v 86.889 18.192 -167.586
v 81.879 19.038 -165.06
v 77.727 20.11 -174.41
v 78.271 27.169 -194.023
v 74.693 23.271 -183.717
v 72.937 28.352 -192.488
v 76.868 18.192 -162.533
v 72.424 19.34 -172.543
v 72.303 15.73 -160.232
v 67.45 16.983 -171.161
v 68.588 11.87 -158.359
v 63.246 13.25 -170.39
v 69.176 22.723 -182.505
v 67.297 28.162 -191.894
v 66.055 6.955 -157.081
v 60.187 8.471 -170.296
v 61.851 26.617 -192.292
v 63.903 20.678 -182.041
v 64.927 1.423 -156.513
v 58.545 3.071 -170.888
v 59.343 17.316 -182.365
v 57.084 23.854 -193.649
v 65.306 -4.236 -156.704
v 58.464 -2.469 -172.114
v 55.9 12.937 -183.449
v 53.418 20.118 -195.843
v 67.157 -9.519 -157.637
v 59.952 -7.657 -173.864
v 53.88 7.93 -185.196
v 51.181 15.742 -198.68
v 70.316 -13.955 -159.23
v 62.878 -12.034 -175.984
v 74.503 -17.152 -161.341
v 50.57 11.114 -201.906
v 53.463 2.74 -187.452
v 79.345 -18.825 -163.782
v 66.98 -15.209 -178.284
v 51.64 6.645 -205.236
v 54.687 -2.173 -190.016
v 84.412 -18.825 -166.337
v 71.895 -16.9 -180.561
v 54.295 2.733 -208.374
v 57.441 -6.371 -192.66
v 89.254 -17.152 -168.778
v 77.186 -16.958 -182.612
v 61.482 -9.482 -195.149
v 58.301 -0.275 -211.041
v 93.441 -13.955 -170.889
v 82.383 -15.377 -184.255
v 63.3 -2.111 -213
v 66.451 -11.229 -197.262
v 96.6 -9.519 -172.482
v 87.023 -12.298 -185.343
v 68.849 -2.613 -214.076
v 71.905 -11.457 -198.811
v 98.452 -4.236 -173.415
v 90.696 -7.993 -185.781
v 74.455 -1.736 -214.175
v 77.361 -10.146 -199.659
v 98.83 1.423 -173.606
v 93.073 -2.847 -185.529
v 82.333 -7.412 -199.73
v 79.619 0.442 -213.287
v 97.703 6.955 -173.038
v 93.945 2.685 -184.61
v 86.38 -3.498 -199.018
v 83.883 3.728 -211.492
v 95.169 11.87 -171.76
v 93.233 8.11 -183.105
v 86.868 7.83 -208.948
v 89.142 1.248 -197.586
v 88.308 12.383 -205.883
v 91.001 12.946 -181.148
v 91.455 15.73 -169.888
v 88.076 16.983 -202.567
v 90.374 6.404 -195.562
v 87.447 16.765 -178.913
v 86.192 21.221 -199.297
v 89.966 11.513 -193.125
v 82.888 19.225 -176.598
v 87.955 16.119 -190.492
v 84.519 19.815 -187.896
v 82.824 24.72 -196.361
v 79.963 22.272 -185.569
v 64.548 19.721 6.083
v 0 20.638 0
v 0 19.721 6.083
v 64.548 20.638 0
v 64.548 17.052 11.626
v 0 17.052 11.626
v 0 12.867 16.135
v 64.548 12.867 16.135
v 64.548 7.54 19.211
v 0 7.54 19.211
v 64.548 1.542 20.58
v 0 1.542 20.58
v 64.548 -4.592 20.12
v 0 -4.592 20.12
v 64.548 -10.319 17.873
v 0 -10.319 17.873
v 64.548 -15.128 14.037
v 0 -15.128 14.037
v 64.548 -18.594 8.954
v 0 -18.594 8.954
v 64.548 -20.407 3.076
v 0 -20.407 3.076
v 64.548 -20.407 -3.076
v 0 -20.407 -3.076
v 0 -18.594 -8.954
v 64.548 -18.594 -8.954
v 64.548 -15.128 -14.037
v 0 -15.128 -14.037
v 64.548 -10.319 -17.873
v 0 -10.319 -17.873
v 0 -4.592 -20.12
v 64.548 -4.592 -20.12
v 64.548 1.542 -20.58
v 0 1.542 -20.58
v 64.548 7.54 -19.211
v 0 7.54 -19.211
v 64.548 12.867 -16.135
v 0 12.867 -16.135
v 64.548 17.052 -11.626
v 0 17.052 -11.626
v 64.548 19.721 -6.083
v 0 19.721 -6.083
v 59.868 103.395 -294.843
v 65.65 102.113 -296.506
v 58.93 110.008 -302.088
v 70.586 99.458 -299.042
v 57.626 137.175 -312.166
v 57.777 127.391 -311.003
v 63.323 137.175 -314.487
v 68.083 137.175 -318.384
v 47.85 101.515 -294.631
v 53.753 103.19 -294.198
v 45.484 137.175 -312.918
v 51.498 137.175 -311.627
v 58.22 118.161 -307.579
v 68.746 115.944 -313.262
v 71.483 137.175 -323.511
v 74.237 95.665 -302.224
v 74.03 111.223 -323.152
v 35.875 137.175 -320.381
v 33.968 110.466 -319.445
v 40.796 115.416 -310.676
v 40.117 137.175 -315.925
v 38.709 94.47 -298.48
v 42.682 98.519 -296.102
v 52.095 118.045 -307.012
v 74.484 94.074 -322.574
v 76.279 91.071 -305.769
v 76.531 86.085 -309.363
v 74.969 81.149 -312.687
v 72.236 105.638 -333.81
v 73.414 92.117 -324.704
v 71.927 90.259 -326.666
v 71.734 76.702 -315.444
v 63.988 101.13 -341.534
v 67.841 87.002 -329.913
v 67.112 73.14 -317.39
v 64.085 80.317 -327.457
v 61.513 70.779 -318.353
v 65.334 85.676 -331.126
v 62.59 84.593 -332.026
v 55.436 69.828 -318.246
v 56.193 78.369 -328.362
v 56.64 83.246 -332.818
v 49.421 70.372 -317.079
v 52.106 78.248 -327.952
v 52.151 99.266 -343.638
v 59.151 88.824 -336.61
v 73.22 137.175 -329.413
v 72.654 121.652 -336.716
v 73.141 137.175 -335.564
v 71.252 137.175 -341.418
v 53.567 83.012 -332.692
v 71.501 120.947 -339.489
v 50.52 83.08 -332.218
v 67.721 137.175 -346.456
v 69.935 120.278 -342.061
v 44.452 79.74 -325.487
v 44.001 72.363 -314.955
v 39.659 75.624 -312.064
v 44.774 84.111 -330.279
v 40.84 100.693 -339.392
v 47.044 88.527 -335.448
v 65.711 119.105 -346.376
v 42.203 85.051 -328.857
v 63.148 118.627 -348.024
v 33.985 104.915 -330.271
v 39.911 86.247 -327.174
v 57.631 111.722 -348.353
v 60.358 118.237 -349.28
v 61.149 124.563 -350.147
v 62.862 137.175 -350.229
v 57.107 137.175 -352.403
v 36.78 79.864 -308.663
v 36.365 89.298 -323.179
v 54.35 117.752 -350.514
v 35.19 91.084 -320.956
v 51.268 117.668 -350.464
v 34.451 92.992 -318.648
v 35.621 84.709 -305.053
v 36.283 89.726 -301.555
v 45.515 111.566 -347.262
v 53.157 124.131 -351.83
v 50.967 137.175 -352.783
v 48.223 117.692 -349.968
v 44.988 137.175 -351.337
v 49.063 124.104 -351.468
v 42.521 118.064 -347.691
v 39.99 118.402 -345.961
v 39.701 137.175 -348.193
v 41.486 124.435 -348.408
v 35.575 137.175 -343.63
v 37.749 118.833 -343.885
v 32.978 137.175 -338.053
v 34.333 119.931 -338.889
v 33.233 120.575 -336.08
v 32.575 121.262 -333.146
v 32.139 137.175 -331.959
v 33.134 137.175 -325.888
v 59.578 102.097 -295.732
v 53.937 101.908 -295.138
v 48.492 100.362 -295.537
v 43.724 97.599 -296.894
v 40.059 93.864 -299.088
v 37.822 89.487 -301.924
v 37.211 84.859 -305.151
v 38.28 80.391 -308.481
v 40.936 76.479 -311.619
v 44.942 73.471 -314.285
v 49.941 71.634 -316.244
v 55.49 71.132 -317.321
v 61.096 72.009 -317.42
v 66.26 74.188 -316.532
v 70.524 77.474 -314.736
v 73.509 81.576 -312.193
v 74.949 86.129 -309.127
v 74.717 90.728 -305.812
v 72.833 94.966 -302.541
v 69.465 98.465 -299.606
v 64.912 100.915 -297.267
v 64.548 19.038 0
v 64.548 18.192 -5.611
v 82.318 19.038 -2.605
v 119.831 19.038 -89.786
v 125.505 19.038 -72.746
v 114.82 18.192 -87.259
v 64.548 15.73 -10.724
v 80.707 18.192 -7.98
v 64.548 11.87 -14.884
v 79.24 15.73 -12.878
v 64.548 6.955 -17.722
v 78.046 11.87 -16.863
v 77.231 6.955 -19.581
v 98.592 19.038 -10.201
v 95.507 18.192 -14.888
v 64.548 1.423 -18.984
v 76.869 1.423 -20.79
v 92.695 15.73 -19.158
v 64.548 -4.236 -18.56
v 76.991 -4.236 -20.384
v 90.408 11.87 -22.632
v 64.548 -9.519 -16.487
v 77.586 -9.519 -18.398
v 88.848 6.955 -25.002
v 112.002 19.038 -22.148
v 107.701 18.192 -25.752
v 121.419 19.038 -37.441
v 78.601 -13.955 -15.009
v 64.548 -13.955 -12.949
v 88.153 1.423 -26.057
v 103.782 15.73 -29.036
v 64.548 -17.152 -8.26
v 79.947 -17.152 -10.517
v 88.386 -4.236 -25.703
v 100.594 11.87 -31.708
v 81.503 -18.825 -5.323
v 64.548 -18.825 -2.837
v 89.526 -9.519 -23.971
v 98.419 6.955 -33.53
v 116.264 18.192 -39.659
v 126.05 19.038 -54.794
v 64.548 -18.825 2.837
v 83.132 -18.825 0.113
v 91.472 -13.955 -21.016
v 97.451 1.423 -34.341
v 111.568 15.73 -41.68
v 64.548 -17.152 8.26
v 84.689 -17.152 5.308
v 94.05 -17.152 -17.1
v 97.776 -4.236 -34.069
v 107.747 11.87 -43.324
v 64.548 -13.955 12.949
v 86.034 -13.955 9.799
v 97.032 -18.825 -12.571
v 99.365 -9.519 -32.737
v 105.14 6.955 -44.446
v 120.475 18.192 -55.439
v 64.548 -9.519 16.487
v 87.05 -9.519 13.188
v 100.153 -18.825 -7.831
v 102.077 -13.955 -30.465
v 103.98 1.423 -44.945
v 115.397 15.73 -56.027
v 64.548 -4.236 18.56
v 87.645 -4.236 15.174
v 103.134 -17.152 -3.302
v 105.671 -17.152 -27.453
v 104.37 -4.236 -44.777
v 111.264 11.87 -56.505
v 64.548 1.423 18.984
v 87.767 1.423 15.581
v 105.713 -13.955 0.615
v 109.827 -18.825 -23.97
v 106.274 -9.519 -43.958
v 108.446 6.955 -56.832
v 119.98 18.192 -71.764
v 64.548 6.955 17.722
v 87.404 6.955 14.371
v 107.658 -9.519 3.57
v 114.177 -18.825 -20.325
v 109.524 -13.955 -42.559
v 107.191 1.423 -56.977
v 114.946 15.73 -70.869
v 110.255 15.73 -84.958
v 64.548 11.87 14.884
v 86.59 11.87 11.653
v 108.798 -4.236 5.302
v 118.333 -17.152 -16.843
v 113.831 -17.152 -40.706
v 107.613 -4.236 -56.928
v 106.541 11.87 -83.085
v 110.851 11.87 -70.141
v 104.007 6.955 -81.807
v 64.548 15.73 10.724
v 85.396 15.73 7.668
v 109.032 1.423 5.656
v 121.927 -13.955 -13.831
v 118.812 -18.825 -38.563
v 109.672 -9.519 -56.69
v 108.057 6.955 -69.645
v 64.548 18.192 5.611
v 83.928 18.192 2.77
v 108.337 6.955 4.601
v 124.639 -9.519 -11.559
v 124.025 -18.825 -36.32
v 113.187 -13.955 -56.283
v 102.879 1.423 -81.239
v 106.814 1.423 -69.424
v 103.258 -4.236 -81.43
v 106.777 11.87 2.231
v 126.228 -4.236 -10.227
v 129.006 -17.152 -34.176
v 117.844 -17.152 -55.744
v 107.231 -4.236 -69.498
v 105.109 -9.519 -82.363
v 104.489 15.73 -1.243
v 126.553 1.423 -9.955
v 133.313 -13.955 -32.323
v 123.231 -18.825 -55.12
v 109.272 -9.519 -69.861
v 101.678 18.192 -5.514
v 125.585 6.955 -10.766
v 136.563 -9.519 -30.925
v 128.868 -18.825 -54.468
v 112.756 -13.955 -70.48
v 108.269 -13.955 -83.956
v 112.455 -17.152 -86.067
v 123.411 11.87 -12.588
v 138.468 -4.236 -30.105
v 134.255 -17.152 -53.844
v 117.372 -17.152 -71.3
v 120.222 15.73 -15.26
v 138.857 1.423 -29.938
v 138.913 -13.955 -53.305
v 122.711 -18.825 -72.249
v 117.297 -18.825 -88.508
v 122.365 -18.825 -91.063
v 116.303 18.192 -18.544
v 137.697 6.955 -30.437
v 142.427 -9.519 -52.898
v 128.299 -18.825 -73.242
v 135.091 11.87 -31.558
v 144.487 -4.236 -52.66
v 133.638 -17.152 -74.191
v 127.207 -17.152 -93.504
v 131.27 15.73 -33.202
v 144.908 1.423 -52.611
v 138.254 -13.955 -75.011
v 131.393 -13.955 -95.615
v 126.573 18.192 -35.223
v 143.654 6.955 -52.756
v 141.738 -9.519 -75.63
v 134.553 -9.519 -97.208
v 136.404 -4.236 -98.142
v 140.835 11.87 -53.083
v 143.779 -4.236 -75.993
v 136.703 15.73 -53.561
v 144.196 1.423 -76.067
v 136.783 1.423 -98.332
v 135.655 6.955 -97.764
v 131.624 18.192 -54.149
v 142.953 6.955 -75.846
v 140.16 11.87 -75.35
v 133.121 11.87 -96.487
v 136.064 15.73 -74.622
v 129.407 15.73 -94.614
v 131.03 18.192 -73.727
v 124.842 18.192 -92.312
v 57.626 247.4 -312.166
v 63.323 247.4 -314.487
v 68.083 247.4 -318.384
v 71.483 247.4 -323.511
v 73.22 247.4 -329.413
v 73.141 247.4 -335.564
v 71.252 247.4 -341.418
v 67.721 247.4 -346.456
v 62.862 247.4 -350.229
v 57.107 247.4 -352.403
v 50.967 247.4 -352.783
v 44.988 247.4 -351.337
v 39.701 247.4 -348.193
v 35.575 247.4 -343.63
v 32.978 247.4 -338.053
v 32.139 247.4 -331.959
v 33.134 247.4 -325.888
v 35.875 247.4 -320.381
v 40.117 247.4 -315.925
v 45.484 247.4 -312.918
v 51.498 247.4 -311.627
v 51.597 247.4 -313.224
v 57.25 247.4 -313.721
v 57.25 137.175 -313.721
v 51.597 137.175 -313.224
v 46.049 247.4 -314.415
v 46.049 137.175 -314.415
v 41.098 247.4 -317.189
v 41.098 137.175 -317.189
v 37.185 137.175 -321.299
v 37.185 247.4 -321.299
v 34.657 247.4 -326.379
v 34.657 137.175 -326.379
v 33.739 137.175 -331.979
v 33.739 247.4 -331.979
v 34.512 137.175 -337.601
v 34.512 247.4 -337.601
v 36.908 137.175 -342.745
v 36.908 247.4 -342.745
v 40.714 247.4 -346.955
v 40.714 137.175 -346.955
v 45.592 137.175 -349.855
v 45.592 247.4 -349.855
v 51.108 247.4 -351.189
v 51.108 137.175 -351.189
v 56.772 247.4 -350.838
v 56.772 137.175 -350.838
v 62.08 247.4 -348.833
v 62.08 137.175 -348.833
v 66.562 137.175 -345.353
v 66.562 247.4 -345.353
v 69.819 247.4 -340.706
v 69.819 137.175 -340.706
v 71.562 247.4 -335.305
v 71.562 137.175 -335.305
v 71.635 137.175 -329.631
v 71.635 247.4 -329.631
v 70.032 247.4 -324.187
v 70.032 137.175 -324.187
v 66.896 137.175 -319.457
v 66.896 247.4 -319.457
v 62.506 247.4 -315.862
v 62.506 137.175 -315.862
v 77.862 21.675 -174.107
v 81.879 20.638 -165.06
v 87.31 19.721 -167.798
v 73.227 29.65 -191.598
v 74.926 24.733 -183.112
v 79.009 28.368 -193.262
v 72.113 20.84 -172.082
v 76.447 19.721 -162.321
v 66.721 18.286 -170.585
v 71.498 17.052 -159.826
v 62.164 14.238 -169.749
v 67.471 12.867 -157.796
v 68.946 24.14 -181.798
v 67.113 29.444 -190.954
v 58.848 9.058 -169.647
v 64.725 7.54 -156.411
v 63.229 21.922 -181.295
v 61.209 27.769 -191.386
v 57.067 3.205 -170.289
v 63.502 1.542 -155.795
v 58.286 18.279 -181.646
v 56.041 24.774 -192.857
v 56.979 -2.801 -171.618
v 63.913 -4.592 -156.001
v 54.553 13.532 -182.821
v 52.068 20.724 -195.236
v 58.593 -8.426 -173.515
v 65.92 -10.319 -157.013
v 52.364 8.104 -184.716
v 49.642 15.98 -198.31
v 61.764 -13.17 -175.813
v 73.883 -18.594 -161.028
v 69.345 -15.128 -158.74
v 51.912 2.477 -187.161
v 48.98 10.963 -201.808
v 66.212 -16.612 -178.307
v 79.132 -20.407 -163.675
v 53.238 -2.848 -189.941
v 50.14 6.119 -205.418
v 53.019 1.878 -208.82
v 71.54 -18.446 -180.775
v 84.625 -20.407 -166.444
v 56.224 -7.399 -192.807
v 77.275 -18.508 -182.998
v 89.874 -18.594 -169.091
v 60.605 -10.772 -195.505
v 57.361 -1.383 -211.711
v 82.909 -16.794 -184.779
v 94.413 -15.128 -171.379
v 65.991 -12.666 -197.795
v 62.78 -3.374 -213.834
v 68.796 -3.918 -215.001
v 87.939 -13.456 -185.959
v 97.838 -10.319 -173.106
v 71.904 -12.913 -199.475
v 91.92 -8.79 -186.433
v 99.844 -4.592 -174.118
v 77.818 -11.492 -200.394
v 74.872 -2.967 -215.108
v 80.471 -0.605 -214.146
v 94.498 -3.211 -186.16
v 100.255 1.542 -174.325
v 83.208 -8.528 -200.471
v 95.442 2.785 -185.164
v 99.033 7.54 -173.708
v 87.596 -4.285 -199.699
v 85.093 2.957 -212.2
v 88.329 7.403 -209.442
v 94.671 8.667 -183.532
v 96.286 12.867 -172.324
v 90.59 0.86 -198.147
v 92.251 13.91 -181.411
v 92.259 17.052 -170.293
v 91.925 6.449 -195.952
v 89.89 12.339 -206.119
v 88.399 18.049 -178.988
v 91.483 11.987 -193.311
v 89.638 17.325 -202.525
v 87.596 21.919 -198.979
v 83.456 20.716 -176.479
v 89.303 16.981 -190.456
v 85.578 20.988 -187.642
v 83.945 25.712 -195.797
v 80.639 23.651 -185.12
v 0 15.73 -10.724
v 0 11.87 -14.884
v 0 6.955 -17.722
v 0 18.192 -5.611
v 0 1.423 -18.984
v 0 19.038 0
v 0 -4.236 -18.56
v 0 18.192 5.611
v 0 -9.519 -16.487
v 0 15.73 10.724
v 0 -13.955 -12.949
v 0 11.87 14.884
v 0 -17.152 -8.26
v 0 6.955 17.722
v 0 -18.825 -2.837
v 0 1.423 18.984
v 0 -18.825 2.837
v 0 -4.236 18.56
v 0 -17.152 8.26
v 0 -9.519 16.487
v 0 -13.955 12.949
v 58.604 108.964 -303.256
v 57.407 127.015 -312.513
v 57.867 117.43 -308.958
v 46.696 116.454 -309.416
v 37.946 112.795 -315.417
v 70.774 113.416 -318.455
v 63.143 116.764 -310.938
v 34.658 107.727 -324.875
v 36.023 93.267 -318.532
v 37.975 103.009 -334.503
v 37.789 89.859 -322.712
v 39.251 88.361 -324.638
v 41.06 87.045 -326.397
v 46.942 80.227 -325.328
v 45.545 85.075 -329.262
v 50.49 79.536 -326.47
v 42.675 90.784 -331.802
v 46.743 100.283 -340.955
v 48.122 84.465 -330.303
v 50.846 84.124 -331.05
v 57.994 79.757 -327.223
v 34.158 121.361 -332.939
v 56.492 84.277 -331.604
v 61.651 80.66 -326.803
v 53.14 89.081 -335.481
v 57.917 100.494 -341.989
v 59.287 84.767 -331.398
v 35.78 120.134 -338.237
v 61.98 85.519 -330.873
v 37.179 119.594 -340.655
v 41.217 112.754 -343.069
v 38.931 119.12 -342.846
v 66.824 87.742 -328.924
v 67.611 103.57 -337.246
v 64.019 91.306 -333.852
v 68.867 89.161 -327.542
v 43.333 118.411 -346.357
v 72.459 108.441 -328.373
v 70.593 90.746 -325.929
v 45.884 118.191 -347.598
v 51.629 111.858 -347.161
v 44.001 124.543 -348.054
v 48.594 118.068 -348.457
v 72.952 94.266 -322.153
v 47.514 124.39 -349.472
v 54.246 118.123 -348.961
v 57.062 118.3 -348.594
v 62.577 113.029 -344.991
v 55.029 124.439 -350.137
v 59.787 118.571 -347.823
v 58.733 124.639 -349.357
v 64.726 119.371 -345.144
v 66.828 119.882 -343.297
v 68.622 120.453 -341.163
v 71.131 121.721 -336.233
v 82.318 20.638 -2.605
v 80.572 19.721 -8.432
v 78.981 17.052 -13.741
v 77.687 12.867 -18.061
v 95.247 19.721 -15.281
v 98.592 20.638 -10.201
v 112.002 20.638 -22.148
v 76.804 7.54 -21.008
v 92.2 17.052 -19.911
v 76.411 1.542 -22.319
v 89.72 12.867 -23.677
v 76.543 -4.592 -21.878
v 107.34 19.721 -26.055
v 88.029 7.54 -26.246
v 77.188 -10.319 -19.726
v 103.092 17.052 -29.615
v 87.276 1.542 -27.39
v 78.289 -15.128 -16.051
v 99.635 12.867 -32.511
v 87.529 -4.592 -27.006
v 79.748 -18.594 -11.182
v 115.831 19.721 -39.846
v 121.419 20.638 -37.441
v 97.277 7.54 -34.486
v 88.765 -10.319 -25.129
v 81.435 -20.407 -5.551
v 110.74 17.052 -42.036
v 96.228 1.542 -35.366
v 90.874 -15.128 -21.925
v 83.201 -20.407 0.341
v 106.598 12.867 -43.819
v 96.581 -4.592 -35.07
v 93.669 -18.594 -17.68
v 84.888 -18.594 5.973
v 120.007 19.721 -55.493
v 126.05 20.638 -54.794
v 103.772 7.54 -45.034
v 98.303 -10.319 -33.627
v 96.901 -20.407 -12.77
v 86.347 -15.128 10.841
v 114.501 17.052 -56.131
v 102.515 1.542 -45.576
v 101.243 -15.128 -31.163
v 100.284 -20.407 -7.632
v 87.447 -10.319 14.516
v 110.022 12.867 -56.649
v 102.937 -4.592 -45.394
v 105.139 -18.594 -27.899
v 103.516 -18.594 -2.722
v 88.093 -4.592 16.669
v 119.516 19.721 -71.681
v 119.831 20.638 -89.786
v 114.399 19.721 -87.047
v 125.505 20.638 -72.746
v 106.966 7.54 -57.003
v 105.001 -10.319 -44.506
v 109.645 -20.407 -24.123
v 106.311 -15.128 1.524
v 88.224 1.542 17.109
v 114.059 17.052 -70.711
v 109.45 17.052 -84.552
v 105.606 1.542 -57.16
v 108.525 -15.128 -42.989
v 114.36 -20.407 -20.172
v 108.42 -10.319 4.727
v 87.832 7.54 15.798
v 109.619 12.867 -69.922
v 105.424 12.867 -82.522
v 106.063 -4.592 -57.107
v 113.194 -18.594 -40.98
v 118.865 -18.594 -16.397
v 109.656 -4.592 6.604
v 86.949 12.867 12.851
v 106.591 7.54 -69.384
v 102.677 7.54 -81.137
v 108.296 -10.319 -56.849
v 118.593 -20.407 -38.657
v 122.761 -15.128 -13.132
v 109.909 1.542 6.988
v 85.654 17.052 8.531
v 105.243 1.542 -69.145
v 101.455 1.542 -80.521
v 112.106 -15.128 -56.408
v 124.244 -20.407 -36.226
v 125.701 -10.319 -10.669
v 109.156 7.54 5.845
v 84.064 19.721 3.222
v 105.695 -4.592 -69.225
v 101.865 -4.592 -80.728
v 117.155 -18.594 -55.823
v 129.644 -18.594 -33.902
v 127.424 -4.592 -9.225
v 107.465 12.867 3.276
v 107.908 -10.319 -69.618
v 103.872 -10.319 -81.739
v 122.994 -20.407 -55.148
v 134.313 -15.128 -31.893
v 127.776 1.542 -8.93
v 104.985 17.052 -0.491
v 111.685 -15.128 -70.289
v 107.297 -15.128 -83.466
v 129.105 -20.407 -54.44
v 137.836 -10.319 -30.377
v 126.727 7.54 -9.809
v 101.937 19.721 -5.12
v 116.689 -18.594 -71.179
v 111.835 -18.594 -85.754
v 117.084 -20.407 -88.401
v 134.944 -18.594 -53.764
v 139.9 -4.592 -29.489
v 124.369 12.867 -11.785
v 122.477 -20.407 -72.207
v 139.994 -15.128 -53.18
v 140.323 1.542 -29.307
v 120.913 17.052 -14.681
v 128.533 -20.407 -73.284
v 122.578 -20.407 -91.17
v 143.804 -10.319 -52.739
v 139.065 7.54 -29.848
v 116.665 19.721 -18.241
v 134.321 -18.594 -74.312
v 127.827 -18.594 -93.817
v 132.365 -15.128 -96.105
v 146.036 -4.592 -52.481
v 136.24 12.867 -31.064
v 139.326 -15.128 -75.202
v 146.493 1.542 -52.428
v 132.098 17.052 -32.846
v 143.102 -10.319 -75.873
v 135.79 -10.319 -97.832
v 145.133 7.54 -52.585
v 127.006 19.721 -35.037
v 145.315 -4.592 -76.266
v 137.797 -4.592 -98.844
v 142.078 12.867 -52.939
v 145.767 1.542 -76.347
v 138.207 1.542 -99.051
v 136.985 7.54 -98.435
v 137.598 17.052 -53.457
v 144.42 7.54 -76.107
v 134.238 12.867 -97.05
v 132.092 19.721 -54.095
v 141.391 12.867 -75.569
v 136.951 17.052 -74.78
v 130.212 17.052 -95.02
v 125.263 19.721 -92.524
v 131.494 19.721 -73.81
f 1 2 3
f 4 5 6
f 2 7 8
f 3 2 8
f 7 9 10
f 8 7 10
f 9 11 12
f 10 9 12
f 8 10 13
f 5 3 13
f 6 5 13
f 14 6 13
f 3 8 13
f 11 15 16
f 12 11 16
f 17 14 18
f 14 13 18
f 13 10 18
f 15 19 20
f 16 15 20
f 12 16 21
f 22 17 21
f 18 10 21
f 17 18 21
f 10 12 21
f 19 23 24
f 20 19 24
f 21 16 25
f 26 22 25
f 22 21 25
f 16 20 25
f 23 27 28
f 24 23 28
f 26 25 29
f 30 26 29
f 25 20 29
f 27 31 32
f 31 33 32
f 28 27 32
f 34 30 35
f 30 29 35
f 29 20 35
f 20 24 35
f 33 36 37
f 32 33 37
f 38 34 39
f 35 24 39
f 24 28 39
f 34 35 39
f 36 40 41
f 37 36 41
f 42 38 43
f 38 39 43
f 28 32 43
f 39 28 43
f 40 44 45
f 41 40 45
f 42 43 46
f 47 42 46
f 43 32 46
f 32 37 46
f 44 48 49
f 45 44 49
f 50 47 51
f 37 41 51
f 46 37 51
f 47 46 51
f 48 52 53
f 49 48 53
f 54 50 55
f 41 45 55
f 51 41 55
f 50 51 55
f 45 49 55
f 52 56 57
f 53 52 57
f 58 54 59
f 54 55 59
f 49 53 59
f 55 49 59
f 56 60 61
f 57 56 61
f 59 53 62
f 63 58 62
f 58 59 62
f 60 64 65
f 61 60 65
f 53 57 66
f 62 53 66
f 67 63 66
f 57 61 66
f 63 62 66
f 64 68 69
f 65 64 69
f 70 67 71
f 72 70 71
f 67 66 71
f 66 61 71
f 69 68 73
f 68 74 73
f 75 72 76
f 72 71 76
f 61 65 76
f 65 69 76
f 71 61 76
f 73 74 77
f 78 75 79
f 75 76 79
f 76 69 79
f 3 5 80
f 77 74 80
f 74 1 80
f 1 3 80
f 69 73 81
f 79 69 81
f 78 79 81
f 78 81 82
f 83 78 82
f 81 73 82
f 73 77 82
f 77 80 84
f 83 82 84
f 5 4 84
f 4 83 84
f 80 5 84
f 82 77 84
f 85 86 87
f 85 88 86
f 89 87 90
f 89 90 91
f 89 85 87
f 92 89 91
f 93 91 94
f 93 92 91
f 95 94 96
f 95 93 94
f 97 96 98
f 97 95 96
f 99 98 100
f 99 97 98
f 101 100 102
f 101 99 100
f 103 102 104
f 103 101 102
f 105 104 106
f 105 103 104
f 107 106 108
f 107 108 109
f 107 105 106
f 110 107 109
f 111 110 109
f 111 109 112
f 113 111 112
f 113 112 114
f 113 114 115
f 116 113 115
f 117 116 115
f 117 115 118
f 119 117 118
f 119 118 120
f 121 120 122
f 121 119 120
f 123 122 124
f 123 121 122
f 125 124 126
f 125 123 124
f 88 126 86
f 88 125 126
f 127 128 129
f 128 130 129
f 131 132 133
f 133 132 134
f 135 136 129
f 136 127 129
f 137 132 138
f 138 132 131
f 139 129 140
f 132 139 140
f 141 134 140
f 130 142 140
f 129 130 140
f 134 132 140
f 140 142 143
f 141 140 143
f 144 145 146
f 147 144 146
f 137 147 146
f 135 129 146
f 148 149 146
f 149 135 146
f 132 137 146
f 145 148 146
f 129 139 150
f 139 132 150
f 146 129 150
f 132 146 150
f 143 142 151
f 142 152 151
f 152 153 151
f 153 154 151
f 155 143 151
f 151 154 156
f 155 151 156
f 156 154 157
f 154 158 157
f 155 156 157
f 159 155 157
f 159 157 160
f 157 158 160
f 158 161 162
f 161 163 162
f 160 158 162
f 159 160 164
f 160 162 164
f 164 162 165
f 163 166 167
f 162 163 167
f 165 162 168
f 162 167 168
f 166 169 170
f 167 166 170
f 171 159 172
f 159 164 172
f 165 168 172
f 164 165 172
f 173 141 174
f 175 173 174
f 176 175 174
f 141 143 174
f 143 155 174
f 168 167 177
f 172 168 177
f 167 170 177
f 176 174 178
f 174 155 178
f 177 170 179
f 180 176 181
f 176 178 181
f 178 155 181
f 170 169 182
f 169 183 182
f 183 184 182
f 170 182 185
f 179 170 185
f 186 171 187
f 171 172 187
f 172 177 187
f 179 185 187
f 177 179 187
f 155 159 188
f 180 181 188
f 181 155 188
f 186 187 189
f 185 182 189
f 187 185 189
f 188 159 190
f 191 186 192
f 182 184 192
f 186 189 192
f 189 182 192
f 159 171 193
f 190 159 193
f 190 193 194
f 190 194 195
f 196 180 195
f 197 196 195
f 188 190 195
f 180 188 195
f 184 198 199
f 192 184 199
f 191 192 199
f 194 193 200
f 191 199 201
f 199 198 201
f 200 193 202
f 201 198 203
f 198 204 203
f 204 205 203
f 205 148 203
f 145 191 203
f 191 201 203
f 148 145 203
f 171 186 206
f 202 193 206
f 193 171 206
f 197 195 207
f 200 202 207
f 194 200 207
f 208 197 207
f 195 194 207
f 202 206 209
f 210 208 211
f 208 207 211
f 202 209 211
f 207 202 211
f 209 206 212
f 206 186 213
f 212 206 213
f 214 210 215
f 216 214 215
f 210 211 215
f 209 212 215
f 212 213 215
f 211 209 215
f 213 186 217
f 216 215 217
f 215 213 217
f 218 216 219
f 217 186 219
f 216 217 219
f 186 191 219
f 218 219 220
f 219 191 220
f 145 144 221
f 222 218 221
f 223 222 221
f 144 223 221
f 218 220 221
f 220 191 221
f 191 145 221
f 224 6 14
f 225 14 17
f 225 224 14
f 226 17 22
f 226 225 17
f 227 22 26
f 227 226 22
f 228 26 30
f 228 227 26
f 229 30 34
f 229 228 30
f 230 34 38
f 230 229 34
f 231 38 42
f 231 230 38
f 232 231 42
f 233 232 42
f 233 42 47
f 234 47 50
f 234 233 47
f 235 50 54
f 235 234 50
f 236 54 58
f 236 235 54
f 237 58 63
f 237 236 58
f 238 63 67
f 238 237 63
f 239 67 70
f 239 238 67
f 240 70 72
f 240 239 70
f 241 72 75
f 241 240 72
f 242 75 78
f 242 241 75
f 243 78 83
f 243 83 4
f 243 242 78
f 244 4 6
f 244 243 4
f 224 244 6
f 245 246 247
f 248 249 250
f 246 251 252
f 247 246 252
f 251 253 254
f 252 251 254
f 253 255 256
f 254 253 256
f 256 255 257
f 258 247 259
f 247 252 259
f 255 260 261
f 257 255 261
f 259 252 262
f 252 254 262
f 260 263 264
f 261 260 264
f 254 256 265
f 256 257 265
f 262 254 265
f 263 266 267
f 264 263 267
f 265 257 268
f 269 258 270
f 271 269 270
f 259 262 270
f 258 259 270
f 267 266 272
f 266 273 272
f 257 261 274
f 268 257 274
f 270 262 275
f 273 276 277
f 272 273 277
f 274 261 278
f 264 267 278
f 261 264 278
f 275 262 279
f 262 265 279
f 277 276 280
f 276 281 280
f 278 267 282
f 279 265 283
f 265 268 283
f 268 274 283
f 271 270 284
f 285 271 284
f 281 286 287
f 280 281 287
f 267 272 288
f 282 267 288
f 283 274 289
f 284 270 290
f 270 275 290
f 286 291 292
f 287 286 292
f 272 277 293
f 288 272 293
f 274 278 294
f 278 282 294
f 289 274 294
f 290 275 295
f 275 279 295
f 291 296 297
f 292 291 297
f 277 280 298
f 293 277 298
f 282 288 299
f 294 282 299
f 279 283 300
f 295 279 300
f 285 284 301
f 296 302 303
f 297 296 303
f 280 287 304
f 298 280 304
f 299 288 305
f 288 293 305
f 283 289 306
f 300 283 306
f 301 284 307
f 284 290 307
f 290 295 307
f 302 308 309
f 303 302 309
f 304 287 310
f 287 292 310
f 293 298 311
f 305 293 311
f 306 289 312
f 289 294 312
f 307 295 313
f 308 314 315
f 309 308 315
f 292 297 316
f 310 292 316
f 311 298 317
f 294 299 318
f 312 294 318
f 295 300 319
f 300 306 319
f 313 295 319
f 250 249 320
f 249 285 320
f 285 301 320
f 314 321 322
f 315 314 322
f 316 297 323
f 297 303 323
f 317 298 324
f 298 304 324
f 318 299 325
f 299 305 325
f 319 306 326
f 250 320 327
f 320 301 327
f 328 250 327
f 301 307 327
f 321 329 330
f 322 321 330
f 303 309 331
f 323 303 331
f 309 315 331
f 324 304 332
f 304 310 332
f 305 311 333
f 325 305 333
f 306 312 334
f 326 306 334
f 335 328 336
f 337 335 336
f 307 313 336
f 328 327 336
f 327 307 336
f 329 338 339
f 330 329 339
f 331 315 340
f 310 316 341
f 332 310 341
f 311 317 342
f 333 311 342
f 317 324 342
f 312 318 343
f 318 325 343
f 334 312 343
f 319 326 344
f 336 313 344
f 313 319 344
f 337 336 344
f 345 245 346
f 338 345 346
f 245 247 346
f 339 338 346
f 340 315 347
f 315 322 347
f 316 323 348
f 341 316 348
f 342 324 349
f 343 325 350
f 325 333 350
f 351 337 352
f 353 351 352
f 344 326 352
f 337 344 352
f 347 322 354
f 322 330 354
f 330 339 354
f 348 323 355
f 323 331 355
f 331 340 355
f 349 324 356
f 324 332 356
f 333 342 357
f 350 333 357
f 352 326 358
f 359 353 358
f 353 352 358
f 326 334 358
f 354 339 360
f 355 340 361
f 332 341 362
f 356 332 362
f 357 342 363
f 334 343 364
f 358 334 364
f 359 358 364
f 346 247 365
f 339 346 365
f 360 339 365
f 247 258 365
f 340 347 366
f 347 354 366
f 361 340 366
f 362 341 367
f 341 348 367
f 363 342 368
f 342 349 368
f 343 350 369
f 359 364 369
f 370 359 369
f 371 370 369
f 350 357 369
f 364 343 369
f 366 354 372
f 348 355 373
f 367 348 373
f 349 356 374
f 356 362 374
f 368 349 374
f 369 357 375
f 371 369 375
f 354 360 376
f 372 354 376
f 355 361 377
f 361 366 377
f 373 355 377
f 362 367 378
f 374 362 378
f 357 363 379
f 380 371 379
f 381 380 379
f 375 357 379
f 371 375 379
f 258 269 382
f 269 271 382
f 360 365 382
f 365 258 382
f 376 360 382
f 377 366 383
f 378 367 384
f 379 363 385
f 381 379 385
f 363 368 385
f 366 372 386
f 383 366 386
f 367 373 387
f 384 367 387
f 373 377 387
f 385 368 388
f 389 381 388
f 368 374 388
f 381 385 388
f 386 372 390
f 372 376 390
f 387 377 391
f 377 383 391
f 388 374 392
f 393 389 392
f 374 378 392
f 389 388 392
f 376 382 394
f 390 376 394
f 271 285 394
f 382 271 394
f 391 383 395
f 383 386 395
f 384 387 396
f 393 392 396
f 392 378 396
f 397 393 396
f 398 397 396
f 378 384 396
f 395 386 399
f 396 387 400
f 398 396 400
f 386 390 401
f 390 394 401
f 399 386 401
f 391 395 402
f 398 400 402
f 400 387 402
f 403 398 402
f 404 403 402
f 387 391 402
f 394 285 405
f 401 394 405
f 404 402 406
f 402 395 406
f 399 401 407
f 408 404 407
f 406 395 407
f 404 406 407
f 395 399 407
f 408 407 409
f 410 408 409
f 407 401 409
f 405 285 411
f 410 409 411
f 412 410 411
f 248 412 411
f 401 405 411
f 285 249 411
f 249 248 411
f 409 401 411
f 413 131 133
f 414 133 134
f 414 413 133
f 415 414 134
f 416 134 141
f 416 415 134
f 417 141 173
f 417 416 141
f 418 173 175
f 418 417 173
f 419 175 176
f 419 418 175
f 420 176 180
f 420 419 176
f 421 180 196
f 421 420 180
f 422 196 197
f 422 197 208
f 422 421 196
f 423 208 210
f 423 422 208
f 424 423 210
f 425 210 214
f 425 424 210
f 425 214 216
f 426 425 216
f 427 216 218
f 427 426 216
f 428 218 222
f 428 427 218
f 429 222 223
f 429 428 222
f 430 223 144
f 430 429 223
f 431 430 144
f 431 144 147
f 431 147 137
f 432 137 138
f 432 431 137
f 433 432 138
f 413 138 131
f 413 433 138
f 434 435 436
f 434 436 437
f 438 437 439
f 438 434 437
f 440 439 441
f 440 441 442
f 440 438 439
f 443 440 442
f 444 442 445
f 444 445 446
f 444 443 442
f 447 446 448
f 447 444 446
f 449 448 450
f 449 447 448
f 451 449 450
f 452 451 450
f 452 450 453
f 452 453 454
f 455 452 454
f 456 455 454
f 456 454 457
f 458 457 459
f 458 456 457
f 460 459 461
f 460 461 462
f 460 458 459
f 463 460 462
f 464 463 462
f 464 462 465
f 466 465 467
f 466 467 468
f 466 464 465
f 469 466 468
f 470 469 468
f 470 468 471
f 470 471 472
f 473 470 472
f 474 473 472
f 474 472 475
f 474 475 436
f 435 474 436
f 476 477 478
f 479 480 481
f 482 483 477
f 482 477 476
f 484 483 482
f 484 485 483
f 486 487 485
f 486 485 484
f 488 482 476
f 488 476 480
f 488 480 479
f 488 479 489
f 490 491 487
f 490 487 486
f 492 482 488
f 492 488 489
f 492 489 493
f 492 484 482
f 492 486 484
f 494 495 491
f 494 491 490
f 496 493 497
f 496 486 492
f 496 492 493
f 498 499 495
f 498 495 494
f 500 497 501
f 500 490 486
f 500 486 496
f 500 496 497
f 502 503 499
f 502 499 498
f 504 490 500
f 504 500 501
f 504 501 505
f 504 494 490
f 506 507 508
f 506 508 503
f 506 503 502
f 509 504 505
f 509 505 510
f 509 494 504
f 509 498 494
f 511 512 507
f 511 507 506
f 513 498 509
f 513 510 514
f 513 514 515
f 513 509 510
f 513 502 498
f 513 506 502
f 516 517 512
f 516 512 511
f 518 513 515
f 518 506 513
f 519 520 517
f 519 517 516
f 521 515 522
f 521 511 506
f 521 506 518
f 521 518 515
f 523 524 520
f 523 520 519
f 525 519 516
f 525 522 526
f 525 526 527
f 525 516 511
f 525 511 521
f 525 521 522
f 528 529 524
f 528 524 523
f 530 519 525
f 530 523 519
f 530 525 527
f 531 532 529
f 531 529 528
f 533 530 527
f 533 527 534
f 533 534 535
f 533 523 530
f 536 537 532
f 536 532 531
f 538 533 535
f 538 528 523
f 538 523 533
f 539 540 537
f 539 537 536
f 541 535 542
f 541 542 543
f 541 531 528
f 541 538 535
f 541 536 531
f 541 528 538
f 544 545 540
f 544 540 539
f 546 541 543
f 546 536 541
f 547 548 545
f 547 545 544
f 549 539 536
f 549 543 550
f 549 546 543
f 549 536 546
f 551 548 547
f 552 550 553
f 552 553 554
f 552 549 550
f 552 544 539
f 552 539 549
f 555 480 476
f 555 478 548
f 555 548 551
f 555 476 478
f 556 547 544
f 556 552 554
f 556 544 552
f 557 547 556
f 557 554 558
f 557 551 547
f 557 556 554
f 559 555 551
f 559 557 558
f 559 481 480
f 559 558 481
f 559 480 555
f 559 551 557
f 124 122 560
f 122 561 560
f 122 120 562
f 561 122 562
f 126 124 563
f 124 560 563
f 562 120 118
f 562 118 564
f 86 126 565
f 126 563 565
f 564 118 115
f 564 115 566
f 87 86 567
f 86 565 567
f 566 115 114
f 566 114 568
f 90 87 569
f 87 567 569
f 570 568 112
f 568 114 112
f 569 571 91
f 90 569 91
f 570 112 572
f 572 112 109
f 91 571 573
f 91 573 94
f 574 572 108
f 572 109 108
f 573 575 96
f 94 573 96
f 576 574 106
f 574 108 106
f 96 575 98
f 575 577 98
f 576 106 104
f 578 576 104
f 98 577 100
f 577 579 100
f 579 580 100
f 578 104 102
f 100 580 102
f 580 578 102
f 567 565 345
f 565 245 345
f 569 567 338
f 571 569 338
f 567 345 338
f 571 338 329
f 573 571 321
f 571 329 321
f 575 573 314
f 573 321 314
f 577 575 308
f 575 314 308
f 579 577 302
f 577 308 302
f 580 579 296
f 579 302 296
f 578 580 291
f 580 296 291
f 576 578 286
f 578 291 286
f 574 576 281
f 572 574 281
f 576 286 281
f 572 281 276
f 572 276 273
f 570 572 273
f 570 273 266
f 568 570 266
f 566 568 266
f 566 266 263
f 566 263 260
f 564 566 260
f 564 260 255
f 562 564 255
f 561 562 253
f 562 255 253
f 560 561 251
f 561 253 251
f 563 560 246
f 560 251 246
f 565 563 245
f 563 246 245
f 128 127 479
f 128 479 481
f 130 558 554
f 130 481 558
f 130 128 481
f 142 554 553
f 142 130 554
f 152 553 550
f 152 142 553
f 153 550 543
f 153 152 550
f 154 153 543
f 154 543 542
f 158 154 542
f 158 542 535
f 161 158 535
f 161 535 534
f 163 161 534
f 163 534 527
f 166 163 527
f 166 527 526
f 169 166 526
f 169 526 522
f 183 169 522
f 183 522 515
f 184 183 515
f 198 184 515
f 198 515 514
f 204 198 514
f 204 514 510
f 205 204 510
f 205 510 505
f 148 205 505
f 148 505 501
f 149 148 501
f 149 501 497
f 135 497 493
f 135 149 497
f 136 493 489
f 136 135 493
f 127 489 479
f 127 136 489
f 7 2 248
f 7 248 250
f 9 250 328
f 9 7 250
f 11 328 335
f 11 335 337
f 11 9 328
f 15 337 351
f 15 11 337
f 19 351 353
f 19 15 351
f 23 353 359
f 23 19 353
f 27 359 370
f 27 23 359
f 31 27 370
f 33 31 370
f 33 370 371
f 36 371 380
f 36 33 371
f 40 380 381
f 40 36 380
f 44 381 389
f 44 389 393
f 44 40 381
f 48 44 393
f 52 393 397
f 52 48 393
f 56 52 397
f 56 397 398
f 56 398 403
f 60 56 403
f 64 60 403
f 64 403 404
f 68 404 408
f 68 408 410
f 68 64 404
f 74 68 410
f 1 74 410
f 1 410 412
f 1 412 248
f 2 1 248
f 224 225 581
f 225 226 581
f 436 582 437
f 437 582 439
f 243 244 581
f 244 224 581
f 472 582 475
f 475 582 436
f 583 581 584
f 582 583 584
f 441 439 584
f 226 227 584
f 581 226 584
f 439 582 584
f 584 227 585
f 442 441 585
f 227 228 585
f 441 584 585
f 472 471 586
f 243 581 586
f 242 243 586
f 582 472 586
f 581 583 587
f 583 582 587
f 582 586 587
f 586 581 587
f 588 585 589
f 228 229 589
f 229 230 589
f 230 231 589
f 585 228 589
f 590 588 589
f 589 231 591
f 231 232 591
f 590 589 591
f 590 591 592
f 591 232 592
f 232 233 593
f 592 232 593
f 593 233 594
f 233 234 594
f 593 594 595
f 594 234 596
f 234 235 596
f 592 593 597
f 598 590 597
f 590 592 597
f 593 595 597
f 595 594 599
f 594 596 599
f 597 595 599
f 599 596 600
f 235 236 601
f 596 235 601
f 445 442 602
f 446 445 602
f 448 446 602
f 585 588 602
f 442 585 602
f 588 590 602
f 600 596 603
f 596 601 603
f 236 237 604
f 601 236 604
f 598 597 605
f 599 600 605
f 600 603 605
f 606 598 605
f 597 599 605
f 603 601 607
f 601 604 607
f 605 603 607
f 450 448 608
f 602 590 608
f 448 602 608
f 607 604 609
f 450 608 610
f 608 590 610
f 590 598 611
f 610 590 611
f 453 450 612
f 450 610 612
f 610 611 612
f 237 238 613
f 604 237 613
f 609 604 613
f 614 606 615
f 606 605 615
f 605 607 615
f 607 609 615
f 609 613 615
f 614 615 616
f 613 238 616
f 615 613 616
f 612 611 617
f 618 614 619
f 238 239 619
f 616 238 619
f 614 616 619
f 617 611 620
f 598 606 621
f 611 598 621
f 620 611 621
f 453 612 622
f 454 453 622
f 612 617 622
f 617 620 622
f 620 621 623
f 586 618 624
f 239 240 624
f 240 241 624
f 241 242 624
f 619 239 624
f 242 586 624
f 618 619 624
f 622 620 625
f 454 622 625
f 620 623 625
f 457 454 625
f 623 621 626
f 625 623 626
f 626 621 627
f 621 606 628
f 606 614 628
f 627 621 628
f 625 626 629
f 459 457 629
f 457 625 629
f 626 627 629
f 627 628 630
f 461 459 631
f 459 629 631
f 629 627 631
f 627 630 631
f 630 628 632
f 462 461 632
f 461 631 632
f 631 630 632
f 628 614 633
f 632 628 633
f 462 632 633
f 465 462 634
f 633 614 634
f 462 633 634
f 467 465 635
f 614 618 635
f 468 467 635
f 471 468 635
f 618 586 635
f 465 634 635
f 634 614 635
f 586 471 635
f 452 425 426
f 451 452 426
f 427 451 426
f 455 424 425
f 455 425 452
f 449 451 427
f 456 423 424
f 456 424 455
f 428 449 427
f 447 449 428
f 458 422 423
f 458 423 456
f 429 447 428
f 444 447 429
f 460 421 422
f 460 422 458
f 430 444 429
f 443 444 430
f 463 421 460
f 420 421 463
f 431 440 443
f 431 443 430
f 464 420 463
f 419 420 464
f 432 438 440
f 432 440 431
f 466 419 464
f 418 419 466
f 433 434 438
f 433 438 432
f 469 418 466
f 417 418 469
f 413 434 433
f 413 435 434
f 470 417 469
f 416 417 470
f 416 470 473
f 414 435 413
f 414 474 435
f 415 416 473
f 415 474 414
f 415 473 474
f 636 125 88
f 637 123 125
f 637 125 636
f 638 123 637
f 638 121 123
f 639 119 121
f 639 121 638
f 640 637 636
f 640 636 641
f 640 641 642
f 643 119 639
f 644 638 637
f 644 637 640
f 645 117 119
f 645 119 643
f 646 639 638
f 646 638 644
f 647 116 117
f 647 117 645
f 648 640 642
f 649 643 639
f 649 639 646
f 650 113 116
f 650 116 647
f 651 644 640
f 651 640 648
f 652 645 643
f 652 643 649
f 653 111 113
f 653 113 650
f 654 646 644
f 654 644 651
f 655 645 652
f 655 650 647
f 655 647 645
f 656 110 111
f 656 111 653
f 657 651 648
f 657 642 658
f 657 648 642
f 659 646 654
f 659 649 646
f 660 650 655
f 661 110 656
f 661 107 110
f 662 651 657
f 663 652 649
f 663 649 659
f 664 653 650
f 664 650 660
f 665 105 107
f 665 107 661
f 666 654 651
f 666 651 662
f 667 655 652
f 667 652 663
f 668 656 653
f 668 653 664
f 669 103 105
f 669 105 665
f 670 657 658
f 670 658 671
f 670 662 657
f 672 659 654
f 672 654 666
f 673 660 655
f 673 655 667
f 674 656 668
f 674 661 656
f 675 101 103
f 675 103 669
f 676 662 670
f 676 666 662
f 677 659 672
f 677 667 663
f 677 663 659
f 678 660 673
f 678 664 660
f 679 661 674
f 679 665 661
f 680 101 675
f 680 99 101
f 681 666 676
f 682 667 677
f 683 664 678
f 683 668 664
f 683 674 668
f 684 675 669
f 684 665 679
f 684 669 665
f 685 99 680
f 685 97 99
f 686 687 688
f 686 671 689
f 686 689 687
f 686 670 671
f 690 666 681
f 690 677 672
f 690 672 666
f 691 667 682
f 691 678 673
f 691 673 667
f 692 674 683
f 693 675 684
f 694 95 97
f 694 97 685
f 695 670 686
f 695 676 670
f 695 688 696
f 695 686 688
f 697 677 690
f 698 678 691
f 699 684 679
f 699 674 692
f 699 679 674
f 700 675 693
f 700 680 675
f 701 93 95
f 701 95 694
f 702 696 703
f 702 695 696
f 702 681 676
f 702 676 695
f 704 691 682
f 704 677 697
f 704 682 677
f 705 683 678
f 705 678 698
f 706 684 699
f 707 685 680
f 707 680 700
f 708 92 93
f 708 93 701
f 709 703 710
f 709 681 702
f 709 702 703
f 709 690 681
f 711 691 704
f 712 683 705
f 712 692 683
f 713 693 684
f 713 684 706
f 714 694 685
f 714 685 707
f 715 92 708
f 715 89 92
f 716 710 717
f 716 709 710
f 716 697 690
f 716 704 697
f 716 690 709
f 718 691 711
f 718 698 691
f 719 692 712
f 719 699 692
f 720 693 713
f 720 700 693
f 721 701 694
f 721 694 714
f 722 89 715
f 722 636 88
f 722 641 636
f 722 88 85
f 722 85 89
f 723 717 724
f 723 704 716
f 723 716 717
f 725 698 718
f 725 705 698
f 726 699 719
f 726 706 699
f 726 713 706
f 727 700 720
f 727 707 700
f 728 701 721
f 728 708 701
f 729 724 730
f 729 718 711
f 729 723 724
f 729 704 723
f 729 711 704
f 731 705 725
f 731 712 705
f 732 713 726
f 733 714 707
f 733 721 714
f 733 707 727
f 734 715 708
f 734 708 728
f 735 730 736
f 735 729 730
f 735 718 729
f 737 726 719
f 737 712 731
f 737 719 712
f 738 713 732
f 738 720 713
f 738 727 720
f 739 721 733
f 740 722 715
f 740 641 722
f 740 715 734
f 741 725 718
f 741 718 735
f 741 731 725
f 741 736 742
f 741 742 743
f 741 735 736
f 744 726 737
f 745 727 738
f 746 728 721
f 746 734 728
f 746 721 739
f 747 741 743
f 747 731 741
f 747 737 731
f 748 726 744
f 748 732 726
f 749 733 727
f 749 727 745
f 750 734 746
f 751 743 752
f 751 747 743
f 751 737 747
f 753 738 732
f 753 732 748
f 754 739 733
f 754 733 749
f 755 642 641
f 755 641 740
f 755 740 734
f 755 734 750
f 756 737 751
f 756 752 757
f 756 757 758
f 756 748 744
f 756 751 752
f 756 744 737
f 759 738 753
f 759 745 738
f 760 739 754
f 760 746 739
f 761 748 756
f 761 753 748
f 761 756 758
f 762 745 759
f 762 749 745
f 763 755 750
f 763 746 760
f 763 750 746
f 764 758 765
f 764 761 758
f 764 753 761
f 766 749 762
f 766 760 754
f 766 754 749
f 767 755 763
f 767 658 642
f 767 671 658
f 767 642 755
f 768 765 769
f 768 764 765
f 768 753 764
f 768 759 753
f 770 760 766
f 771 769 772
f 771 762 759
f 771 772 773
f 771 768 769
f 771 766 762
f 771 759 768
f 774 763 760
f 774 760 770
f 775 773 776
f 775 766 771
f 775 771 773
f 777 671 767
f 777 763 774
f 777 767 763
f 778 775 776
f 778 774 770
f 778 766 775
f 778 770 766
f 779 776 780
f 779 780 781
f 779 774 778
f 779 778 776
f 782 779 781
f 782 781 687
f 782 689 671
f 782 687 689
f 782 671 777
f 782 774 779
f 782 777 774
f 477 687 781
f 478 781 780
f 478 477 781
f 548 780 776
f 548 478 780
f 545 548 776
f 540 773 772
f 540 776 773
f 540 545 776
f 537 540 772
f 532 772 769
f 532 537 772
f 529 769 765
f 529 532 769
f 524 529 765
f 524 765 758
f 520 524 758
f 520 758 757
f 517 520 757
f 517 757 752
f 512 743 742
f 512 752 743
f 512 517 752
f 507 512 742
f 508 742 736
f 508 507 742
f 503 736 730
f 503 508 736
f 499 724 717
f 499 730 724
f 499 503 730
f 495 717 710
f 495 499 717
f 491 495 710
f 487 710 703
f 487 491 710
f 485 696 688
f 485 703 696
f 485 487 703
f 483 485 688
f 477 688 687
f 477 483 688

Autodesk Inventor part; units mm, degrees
sketch "Sketch1" plane through (0, 0, 0) normal (1, 0, 0) x (0, 1, 0)
  line L0 (0, 0) -> (0, -185)
  line L1 (0, -185) -> (105.16, -332.225)
  line L2 (105.16, -332.225) -> (247.4, -332.225)
  line L3 (0, 0) -> (0, -165.1) construction
  line L4 (0, -165.1) -> (0, -71.825) construction
  line L5 (0, -71.825) -> (105.16, -52.775) construction
  line L6 (105.16, -52.775) -> (247.4, -52.775) construction
  dimension "d0" = 332.225
  dimension "d4" = 185
  dimension "d5" = 247.4
  dimension "d6" = 165.1
  dimension "d7" = 52.775
  dimension "d8" = 71.825
  dimension "d19" = 0
  dimension "d20" = 142.24
ref_plane "Work Plane1" through (165.1, 0, 0) normal (1, 0, 0) x (0, 1, 0)
ref_plane "Work Plane2" through (71.825, 0, 0) normal (1, 0, 0) x (0, 1, 0)
ref_plane "Work Plane3" through (52.775, 0, 0) normal (1, 0, 0) x (0, 1, 0)
sketch "Sketch2" plane through (165.1, 0, 0) normal (1, 0, 0) x (0, 1, 0)
  point P0 (0, 0)
  point P1 (0, 0)
sketch "Sketch3" plane through (71.825, 0, 0) normal (1, 0, 0) x (0, 1, 0)
  point P0 (0, 0)
  point P1 (0, -185)
  point P2 (105.16, -332.225)
sketch "Sketch4" plane through (52.775, 0, 0) normal (1, 0, 0) x (0, 1, 0)
  point P0 (0, 0)
  point P1 (247.4, -332.225)
  point P2 (105.16, -332.225)
sketch "Sketch5" plane through (0, 0, 0) normal (1, 0, 0) x (0, 1, 0)
  circle A0 centre (0, 0) radius 20.6375
  circle A1 centre (0, 0) radius 19.0375
  dimension "d15" = 1.6
  dimension "d17" = 41.275
sketch3d "3D Sketch1"
  line L0 (0, 0, 0) -> (64.5477, 0, 0)
  arc A0 (64.5477, 0, 0) -> (119.831, 0, -89.7857) centre (64.5477, 0, -61.9125) ccw
  line L1 (119.831, 0, -89.7857) -> (81.8787, 0, -165.0596)
  arc A1 (81.8787, 0, -165.0596) -> (69.4866, 12.9085, -203.0721) centre (105.334, 56.0639, -176.8854) ccw
  line L2 (69.4866, 12.9085, -203.0721) -> (56.1274, 86.654, -306.3164)
  arc A2 (56.1274, 86.654, -306.3164) -> (52.775, 137.1751, -332.225) centre (60.7199, 137.1751, -270.8244) ccw
  line L3 (52.775, 137.1751, -332.225) -> (52.775, 247.4, -332.225)
  dimension "d13" = 61.9125
  dimension "d14" = 61.9125
  dimension "d12" = 61.9125
sweep "Sweep1" add profiles "Sketch5" path "3D Sketch1"
equation "\"d13\" = d12"
equation "\"d14\" = d12"
equation "\"d9\" = d6"
equation "\"d10\" = d8"
equation "\"d11\" = d7"
properties part number "exhaust header right pipe 5" material "Steel"
